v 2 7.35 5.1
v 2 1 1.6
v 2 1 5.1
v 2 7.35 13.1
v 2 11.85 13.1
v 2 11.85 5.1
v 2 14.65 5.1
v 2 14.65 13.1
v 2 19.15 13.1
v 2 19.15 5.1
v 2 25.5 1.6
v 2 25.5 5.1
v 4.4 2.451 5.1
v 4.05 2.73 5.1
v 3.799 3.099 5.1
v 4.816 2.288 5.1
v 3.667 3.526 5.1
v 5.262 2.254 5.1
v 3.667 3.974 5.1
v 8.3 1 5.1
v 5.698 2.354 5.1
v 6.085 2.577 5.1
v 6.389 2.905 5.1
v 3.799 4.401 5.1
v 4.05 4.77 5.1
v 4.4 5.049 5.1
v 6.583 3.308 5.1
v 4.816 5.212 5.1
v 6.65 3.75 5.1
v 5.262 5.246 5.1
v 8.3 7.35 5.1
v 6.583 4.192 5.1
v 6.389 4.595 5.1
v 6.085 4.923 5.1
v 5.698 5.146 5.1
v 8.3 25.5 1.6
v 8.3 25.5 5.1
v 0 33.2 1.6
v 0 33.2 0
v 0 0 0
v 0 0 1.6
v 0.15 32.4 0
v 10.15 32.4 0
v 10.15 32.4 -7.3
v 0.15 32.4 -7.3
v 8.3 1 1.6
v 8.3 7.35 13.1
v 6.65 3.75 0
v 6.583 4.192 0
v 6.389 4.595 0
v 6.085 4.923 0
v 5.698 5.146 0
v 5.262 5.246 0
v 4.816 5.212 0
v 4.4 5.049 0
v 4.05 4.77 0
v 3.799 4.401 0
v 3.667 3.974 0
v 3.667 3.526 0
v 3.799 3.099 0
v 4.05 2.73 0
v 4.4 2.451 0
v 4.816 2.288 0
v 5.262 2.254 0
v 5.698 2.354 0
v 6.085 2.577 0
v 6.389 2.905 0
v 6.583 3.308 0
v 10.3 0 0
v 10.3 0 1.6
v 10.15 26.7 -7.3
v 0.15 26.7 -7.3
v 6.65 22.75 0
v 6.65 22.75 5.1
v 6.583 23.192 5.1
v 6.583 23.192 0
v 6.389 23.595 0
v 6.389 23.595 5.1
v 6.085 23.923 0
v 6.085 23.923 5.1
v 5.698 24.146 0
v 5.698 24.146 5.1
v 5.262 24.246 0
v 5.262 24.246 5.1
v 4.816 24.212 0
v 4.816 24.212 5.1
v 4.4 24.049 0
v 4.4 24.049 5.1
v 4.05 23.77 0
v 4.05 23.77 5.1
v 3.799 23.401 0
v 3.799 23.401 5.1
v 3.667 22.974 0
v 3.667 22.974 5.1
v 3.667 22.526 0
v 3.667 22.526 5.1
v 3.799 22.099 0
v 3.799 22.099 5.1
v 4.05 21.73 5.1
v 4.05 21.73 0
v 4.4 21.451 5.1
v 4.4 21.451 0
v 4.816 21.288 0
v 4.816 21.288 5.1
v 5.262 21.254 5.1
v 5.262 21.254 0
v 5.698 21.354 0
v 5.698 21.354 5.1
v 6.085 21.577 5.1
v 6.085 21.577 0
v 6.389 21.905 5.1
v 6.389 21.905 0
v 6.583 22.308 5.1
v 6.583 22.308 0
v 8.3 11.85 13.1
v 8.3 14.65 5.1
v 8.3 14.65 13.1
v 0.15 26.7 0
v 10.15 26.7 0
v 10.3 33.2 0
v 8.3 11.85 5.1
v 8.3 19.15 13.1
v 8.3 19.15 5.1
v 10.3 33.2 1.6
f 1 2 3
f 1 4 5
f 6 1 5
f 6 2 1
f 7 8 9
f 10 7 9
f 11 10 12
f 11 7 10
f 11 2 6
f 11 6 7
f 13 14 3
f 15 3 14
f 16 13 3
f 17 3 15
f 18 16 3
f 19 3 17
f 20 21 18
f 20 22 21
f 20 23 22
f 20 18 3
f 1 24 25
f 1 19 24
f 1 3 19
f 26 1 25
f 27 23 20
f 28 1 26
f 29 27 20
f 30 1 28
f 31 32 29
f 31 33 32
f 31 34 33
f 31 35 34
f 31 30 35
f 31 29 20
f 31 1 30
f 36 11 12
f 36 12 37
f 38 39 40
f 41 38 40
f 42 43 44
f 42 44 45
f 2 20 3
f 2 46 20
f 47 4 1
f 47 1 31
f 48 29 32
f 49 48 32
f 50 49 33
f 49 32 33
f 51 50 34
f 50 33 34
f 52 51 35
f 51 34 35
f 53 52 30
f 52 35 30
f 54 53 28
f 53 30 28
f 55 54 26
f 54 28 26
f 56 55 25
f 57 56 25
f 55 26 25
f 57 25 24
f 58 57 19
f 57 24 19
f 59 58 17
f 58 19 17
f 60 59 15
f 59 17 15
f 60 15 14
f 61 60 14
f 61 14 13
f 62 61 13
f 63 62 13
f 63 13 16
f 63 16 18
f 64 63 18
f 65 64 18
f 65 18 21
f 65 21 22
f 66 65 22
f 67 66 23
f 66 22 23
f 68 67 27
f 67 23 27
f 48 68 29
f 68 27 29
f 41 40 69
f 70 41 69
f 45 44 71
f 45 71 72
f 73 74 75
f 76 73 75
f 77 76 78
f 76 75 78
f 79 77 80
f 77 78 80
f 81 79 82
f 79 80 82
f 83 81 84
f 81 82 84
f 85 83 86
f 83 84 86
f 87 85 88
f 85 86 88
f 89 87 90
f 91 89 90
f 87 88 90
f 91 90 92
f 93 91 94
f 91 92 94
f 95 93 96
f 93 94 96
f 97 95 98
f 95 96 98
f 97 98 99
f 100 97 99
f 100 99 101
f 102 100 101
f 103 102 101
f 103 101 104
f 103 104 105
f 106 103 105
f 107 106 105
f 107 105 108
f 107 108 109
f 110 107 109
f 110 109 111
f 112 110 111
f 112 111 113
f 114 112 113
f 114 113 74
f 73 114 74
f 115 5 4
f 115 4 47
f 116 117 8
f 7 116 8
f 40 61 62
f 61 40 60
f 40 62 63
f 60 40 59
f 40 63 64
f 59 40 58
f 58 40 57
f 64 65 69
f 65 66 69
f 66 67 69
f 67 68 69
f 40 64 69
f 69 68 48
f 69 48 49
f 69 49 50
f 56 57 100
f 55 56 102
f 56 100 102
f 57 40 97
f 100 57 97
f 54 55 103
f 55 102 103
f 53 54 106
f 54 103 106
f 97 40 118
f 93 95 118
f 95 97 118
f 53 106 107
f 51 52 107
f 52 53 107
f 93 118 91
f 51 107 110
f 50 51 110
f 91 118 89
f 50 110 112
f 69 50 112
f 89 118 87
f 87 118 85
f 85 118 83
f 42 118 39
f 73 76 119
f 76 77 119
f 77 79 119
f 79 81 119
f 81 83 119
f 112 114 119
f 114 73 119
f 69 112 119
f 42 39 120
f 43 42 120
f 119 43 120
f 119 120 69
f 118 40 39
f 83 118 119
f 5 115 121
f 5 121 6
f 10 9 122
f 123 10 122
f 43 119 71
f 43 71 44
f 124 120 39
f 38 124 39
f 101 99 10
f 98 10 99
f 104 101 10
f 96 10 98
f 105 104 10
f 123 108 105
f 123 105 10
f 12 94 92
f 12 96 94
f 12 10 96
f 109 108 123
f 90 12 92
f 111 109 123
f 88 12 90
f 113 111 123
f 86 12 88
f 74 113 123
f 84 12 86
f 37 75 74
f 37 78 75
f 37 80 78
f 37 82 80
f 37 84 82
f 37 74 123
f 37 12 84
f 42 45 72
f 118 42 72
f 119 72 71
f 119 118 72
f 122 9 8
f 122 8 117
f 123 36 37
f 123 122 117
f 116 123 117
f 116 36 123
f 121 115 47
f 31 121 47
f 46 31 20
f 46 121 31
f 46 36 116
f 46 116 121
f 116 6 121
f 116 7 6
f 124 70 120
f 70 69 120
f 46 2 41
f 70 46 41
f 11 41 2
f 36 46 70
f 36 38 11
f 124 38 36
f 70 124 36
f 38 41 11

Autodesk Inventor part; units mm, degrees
ref_plane "YZ Plane" through (0, 0, 0) normal (1, 0, 0) x (0, 1, 0)
ref_plane "XZ Plane" through (0, 0, 0) normal (0, 1, 0) x (-1, 0, 0)
ref_plane "XY Plane" through (0, 0, 0) normal (0, 0, 1) x (1, 0, 0)
sketch "Sketch1" plane through (0, 0, 0) normal (0, 0, 1) x (1, 0, 0)
  line L0 (0, 0) -> (10.3, 0)
  line L1 (10.3, 0) -> (10.3, 33.2)
  line L2 (10.3, 33.2) -> (0, 33.2)
  line L3 (0, 33.2) -> (0, 0)
  dimension "d0" = 10.3
  dimension "d1" = 33.2
extrude "Extrusion1" add sketch "Sketch1" along normal blind 1.6
sketch "Sketch2" plane through (0, 0, 1.6) normal (0, 0, 1) x (1, 0, 0)
  line L0 (0, 0) -> (10.3, 0) projected
  line L1 (10.3, 0) -> (10.3, 33.2) projected
  line L2 (2, 25.5) -> (8.3, 25.5)
  line L3 (8.3, 25.5) -> (8.3, 1)
  line L4 (8.3, 1) -> (2, 1)
  line L5 (2, 1) -> (2, 25.5)
  dimension "d4" = 6.3
  dimension "d5" = 24.5
  dimension "d6" = 1
  dimension "d7" = 2
extrude "Extrusion2" add sketch "Sketch2" along normal blind 3.5
sketch "Sketch3" plane through (0, 0, 5.1) normal (0, 0, 1) x (1, 0, 0)
  line L0 (2, 25.5) -> (2, 1) projected
  line L1 (2, 1) -> (8.3, 1) projected
  line L2 (8.3, 1) -> (8.3, 25.5) projected
  line L3 (8.3, 11.85) -> (2, 11.85)
  line L4 (2, 7.35) -> (8.3, 7.35)
  line L5 (8.3, 14.65) -> (2, 14.65)
  line L6 (2, 19.15) -> (8.3, 19.15)
  point P0 (0, 0)
  dimension "d10" = 4.5
  dimension "d11" = 4.5
  dimension "d12" = 2.8
  dimension "d13" = 10.85
extrude "Extrusion3" add sketch "Sketch3" along normal blind 8 contours L6 L2 L5 L0 | L3 L2 L4 L0
sketch "Sketch4" plane through (0, 0, 0) normal (0, 0, -1) x (-1, 0, 0)
  line L0 (-10.3, 33.2) -> (0, 33.2) projected
  line L1 (-10.3, 0) -> (-10.3, 33.2) projected
  line L2 (-10.15, 32.4) -> (-0.15, 32.4)
  line L3 (-0.15, 32.4) -> (-0.15, 26.7)
  line L4 (-0.15, 26.7) -> (-10.15, 26.7)
  line L5 (-10.15, 26.7) -> (-10.15, 32.4)
  dimension "d16" = 10
  dimension "d17" = 5.7
  dimension "d18" = 0.15
  dimension "d19" = 0.8
extrude "Extrusion4" add sketch "Sketch4" along normal blind 7.3
sketch "Sketch5" plane through (0, 0, 5.1) normal (0, 0, 1) x (1, 0, 0)
  line L0 (2, 25.5) -> (2, 19.15) projected
  line L1 (8.3, 7.35) -> (2, 7.35) projected
  line L2 (2, 7.35) -> (2, 1) projected
  line L3 (2, 1) -> (8.3, 1) projected
  line L4 (8.3, 1) -> (8.3, 7.35) projected
  circle A0 centre (5.15, 3.75) radius 1.5
  circle A1 centre (5.15, 22.75) radius 1.5
  point P0 (0, 0)
  dimension "d22" = 3
  dimension "d23" = 19
  dimension "d24" = 3.15
  dimension "d25" = 2.75
extrude "Extrusion5" cut sketch "Sketch5" against normal up to next contours A0 | A1
properties part number "EndStopOptical"
